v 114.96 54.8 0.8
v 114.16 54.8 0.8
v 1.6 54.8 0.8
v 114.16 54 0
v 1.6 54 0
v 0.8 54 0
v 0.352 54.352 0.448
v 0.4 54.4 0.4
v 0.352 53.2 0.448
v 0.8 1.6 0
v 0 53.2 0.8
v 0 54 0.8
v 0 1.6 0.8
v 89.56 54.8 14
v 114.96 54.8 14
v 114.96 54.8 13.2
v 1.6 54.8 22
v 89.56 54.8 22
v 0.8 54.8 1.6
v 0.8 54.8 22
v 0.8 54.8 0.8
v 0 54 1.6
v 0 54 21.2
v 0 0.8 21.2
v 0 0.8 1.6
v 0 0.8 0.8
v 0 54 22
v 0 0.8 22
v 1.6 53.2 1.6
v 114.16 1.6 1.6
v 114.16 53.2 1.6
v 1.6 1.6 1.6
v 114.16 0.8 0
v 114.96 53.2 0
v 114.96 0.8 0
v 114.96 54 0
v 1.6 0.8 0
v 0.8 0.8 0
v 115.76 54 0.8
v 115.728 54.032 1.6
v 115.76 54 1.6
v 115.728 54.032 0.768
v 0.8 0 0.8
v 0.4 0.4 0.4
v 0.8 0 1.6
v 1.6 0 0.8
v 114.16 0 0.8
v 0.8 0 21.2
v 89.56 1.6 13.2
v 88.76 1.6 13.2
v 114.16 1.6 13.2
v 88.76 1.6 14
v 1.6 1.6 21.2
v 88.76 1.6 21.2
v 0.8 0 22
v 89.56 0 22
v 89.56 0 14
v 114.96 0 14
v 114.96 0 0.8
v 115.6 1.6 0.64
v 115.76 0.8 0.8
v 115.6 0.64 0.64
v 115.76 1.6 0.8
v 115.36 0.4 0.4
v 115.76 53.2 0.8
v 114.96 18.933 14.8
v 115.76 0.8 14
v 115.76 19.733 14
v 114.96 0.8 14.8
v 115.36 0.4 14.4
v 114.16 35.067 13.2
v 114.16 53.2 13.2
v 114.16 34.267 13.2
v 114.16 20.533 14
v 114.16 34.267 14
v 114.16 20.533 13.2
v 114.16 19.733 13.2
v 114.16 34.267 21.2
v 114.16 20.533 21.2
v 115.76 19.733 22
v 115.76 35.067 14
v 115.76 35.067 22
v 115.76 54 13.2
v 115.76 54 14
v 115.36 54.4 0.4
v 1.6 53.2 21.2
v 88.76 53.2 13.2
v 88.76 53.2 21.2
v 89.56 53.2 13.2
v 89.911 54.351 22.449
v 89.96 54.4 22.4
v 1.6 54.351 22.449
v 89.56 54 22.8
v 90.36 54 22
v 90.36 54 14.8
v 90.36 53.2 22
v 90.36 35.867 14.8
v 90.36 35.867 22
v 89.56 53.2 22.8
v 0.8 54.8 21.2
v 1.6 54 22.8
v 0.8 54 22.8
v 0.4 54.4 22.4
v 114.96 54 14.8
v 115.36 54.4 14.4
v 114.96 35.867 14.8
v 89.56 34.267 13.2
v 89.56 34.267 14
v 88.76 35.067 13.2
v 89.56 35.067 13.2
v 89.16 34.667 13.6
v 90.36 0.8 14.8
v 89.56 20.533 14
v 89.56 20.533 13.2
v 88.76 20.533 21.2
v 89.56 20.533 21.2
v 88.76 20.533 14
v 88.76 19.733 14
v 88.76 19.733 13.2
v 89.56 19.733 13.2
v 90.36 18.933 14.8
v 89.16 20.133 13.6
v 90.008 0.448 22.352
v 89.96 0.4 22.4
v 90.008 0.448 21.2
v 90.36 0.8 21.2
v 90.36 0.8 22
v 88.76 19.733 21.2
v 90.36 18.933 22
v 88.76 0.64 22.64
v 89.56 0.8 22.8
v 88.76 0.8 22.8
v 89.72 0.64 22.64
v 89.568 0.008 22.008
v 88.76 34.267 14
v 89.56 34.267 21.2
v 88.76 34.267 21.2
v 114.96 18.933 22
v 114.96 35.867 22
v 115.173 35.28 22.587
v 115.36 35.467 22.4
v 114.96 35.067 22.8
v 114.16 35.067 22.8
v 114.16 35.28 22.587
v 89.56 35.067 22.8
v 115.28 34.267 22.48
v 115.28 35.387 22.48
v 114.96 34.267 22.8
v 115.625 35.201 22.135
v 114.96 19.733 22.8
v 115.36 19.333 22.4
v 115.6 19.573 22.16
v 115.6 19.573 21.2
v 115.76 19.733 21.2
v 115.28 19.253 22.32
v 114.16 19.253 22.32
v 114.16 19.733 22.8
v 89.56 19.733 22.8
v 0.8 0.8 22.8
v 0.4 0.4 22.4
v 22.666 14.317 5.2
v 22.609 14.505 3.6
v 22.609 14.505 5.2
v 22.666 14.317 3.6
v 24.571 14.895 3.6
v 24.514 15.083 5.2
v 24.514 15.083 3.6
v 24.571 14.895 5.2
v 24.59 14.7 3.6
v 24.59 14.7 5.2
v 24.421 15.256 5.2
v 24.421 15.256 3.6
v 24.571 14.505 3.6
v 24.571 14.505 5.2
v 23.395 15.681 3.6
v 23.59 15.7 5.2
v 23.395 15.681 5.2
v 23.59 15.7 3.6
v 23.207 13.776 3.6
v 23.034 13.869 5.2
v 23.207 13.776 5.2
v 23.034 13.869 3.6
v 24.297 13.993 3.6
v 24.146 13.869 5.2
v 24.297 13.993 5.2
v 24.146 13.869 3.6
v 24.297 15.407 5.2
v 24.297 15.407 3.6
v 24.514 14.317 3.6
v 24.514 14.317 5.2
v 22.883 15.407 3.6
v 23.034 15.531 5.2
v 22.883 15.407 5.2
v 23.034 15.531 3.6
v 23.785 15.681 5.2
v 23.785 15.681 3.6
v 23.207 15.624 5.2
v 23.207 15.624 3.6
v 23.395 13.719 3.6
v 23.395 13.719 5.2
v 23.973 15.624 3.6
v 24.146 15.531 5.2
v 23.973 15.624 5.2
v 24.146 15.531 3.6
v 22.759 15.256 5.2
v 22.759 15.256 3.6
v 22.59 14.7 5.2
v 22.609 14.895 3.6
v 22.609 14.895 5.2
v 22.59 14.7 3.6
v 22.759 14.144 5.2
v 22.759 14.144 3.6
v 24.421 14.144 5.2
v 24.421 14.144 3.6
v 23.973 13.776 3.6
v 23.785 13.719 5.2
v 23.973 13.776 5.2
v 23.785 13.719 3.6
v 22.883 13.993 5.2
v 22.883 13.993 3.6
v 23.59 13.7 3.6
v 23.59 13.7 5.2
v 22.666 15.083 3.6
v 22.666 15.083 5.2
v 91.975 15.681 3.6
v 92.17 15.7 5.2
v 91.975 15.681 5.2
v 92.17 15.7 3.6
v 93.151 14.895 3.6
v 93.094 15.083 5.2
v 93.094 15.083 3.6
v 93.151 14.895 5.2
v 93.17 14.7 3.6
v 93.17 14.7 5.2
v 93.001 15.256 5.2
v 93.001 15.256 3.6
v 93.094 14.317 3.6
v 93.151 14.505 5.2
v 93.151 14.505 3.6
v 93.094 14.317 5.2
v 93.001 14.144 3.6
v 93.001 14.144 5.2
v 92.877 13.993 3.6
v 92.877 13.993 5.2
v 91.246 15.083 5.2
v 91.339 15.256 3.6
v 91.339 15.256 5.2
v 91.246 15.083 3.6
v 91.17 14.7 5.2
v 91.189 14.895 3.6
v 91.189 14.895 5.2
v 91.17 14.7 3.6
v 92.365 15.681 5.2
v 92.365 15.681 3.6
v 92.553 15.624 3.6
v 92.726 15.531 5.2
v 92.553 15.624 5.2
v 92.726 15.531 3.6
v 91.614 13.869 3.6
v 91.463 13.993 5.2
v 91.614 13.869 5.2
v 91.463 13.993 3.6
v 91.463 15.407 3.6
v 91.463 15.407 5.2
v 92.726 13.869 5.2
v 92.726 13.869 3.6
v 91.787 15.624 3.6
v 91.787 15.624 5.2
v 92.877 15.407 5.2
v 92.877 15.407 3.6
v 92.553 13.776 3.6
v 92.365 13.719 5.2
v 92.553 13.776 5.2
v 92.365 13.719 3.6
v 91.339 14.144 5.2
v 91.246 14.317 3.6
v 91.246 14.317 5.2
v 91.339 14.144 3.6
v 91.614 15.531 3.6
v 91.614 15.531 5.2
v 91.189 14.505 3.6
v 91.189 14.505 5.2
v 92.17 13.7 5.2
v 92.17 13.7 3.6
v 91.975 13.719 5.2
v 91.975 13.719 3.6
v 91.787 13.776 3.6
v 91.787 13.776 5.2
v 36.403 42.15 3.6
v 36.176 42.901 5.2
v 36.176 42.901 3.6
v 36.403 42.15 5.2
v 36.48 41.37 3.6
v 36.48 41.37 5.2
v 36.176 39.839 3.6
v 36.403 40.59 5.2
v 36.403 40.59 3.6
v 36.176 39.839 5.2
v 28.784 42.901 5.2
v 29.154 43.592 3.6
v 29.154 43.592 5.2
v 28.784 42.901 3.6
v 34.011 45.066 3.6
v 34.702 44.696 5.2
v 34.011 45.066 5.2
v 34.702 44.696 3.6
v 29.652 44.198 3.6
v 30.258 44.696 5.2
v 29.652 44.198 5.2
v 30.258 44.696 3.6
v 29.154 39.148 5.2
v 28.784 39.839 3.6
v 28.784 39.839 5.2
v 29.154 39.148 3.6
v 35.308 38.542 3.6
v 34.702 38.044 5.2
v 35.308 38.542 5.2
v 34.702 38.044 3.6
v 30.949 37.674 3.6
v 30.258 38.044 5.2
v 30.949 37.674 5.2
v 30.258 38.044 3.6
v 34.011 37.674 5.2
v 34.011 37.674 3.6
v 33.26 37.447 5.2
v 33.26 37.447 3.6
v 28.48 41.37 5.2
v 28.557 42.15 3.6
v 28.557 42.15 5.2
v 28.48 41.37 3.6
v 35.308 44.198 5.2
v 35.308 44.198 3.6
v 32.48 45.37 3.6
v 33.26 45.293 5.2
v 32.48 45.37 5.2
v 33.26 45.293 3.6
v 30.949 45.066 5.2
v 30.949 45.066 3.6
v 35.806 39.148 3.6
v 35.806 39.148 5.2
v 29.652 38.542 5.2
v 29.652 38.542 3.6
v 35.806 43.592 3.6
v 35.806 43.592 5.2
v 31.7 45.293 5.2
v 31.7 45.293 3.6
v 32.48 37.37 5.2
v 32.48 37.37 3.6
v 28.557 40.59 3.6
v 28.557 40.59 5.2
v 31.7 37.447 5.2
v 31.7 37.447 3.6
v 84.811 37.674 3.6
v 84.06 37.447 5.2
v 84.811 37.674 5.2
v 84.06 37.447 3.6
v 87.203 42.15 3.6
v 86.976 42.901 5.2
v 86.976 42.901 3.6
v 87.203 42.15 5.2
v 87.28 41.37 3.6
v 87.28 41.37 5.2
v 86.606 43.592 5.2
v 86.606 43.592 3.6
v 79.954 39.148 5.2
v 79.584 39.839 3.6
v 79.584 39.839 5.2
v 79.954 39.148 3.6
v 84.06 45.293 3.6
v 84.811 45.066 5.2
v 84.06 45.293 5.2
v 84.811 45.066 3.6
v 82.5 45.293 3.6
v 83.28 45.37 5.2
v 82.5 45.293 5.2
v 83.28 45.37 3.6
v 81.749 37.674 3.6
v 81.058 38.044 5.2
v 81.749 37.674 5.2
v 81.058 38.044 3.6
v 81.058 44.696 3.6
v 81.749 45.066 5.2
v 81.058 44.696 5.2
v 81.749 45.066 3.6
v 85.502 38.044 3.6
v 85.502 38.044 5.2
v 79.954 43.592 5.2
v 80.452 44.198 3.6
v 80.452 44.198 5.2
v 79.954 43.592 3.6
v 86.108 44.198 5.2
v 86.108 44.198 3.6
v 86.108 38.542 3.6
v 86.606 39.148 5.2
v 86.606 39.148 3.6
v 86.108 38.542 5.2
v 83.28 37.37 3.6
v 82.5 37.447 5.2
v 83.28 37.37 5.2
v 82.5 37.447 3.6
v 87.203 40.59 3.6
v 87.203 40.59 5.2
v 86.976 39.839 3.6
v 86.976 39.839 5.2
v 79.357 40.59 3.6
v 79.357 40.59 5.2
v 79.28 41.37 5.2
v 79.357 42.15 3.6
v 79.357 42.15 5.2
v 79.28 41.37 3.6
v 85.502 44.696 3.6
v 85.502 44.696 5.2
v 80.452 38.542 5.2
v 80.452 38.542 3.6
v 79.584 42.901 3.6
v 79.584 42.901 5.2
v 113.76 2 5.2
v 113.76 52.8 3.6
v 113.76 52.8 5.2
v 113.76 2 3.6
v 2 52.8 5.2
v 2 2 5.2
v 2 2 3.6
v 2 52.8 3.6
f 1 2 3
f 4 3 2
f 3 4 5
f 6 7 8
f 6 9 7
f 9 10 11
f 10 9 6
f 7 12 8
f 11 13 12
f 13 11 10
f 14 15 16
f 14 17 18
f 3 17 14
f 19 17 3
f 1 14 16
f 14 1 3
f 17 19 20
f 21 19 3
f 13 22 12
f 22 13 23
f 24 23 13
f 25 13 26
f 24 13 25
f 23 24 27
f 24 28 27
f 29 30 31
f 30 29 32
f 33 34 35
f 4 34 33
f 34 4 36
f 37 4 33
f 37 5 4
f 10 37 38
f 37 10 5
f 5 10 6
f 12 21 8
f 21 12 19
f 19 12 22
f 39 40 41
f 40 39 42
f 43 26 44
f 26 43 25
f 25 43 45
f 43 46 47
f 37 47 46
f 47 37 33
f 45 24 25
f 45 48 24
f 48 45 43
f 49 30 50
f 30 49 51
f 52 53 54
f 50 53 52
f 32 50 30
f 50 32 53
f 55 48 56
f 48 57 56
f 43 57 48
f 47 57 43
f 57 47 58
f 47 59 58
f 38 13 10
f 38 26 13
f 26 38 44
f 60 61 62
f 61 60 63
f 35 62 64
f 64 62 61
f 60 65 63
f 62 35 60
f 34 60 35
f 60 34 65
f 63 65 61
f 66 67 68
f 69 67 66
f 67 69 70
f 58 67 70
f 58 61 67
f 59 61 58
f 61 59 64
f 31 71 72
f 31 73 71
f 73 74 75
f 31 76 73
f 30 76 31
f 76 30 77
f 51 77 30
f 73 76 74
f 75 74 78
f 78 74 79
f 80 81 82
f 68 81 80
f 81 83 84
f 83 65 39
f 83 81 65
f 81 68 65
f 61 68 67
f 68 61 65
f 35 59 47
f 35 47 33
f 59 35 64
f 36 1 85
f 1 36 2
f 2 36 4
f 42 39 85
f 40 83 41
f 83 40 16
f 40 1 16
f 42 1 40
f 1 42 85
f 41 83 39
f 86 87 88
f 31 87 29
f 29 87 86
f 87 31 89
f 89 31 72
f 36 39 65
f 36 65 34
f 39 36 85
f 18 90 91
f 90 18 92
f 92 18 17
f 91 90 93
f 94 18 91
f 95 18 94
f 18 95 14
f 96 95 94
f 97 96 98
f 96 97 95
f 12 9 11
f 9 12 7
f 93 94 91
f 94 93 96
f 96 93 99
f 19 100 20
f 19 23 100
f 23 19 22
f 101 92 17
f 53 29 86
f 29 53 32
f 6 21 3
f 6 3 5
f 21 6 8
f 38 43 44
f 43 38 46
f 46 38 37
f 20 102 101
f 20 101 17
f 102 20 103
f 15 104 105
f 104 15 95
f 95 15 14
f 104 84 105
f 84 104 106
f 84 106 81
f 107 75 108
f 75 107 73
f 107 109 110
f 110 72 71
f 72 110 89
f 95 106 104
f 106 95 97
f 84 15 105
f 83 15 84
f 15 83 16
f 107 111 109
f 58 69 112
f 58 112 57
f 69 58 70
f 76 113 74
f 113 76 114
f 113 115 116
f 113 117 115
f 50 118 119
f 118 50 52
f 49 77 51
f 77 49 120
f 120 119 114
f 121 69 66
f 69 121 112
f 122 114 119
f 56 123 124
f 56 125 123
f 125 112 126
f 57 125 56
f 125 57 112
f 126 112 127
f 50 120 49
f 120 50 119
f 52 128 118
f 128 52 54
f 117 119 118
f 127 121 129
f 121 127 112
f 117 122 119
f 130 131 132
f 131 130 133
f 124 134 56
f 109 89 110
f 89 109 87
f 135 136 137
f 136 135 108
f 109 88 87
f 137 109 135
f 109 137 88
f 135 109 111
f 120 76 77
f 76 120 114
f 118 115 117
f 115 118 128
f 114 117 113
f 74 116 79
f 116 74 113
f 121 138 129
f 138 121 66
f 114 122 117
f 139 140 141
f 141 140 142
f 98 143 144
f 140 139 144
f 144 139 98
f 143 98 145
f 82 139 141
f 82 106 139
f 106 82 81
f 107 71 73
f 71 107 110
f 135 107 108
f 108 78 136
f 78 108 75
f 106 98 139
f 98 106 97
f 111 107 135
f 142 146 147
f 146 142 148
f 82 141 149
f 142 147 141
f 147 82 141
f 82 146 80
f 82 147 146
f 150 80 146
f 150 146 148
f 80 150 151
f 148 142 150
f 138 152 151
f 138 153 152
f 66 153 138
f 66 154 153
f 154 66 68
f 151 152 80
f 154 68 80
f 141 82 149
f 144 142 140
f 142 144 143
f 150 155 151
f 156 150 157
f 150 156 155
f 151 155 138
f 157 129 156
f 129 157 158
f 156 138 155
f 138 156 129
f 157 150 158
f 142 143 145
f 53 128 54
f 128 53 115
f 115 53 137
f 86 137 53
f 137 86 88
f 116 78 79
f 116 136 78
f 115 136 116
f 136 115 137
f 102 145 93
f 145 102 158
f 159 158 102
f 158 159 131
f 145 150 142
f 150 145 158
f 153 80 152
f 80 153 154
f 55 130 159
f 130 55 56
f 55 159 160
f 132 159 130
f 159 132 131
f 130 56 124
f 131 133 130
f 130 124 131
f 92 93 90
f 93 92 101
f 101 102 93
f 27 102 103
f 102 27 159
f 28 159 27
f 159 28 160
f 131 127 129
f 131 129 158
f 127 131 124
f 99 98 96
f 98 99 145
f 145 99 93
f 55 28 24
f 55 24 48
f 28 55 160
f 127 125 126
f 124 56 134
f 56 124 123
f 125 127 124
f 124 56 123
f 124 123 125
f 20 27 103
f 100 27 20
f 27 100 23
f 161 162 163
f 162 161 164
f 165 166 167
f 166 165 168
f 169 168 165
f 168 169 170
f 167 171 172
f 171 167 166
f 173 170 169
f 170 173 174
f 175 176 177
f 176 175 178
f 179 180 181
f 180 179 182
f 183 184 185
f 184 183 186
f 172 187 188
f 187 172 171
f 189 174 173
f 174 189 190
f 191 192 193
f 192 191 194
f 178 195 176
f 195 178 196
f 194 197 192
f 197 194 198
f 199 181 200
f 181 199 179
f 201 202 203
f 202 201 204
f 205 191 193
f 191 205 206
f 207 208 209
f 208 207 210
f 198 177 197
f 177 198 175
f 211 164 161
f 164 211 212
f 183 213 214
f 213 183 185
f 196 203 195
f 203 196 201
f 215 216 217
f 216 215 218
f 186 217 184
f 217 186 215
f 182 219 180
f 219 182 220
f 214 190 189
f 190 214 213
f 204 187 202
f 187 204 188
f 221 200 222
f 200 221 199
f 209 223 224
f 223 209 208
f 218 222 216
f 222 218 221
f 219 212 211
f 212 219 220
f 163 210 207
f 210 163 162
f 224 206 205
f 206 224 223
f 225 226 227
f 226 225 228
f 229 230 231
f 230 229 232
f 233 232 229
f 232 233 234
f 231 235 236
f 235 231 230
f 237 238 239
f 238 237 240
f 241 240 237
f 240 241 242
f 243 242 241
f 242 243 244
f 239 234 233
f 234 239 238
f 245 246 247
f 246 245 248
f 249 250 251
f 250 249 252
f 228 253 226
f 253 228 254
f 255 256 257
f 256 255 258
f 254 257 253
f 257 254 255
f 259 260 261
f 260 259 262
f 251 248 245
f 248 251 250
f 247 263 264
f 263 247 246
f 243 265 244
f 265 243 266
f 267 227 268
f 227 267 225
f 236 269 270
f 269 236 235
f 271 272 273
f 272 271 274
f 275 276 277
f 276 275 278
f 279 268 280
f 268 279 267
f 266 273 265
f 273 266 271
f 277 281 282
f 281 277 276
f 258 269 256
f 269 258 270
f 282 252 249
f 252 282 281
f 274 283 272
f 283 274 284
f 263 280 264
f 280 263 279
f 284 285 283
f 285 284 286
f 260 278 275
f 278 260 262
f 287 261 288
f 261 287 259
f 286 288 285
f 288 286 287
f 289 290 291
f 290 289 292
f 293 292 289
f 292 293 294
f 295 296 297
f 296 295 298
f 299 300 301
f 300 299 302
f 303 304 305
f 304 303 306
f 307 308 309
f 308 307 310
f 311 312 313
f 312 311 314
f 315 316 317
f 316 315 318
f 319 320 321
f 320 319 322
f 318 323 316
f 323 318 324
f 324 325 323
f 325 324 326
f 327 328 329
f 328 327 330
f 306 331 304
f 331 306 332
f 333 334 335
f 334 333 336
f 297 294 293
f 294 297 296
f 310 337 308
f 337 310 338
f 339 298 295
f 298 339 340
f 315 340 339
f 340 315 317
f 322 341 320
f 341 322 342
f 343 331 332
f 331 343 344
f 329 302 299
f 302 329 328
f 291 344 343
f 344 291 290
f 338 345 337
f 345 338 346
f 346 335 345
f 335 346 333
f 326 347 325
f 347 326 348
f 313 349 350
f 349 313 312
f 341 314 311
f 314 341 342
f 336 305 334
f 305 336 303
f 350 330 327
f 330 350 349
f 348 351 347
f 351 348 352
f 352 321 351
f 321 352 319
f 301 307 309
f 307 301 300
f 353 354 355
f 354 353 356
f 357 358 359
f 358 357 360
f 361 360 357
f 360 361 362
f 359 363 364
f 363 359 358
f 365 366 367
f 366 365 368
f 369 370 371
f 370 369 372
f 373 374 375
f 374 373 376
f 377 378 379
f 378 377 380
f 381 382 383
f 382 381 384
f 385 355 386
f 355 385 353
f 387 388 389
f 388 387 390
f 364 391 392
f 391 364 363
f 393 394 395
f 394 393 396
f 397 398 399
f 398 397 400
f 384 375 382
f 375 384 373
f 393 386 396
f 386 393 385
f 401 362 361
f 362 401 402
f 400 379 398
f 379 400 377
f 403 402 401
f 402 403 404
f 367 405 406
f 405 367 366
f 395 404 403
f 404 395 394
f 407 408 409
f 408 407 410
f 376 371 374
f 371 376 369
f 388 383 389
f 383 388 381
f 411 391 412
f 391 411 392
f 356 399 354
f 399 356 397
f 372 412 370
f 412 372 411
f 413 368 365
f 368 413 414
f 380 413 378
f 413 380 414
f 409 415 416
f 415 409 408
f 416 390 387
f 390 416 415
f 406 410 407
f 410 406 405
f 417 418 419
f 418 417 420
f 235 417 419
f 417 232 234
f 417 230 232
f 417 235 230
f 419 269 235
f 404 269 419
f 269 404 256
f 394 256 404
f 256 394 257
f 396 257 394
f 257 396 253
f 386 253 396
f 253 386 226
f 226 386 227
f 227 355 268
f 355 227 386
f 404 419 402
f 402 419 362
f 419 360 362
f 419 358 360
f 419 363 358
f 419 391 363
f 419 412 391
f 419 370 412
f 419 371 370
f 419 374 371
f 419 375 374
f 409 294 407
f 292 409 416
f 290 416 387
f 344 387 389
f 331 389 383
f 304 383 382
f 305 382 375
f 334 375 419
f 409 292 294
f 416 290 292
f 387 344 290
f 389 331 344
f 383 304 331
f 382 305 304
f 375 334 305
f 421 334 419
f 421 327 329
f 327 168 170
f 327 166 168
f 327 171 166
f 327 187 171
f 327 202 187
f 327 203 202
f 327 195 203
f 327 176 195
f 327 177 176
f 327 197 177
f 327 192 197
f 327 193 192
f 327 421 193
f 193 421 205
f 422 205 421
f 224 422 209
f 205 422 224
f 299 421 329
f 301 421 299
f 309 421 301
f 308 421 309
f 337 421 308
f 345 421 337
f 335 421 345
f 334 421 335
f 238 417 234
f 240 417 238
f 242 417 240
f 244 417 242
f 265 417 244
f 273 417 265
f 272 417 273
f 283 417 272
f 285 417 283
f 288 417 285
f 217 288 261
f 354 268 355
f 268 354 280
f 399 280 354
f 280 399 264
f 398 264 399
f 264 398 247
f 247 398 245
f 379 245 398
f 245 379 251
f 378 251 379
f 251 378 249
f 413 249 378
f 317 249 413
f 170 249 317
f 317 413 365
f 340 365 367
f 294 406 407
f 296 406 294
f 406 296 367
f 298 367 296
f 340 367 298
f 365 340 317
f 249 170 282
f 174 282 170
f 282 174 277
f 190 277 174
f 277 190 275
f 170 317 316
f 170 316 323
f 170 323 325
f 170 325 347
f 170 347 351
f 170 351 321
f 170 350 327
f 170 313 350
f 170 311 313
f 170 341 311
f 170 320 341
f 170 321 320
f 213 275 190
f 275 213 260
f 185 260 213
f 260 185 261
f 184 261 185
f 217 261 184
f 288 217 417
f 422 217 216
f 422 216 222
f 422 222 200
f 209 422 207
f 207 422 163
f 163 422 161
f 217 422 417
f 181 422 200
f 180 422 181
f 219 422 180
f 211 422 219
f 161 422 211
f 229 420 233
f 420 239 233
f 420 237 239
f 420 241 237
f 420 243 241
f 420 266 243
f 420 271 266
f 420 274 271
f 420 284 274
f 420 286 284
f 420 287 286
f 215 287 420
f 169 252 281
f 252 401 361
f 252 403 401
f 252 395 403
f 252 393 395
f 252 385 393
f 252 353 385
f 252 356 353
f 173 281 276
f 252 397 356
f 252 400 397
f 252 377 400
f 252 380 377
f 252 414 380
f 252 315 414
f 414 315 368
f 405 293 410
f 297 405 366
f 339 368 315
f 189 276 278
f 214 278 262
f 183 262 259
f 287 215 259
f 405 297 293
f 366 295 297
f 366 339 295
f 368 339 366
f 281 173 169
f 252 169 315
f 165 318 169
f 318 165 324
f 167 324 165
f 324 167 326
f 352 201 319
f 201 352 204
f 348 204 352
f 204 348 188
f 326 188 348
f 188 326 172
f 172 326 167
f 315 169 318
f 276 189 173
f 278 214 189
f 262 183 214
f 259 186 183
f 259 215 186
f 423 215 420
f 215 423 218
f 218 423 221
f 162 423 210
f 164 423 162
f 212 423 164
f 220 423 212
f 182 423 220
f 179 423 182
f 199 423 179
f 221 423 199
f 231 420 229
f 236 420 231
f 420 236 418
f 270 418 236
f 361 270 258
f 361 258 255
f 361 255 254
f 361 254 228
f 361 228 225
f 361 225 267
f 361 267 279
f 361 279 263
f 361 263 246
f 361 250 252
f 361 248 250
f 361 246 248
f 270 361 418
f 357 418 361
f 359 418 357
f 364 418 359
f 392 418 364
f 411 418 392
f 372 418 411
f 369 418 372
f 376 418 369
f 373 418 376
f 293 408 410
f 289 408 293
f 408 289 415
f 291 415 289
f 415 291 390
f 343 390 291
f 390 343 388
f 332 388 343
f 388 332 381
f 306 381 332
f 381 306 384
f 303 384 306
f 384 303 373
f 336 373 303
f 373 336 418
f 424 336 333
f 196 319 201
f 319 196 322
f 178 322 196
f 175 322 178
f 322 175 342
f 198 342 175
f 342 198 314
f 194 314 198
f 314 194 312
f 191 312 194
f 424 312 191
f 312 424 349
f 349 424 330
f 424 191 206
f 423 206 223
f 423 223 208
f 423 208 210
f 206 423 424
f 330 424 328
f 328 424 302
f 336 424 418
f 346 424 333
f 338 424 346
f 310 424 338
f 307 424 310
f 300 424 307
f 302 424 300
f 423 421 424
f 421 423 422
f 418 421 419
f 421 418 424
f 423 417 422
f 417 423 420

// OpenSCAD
$fn=32;

PCB_BELOW=2;
PCB_T=1.6;      // pcb thickness
PCB_S=2-PCB_T;  // spacing between pcb/wall
PCB_Z=2;        // spacing between pcb/botton
PCB_OVER=16.555;
WALL_TH=1.6;

MIL=25.4/1000;
PCB_W=4400 * MIL;
PCB_W0=3400 * MIL;
PCB_H=2000 * MIL;
PCB_HB_X=1200 * MIL;
PCB_HB_Y=450 * MIL;
PCB_HA_X=850 * MIL;
PCB_HA_Y=500 * MIL;

PCB_OVER=16;       // space needed above pcb


module holeCutter(w) {
	translate([0,0,-5])
	cylinder(d1=w,d2=w,h=10);
}

module atPcbMountHolePositions() {
translate([PCB_HA_X,PCB_HA_Y,0])
	children();
translate([PCB_W-PCB_HA_X,PCB_HA_Y,0])
	children();
}
module atBoxMountHolePositions() {
translate([PCB_HB_X,PCB_H-PCB_HB_Y,0])
	children();
translate([PCB_W-PCB_HB_X,PCB_H-PCB_HB_Y,0])
	children();
}
module pcb() {
    color([.3,.7,0])
    difference() {
    cube([PCB_W,PCB_H,PCB_T] );
    atPcbMountHolePositions()
        holeCutter(2);
    atBoxMountHolePositions()
        holeCutter(8);

    }
}

// chamfered on the XZ plane
module cube1(a){
     XM=a[0]+a[1]+a[2];
    DEPTH=WALL_TH/2;
    difference(){
        cube([a[0],a[1],a[2]]);
    
        rotate(45,[0,1,0]){
            cube([sqrt(2)*DEPTH,3*a[1],sqrt(2)*DEPTH],center=true);
        }
        translate([a[0],0,0])
        rotate(45,[0,1,0]){
            cube([sqrt(2)*DEPTH,3*a[1],sqrt(2)*DEPTH],center=true);
        }
        translate([a[0],0,a[2]])
        rotate(45,[0,1,0]){
            cube([sqrt(2)*DEPTH,3*a[1],sqrt(2)*DEPTH],center=true);
        }
        translate([0,0,a[2]])
        rotate(45,[0,1,0]){
            cube([sqrt(2)*DEPTH,3*a[1],sqrt(2)*DEPTH],center=true);
        }
        translate([0,DEPTH,0]) {
            rotate(-135,[0,0,1])
                    translate([0,0,-1])
                    cube(XM,XM,XM);
            translate([a[0],0,0])
            rotate(-135,[0,0,1])
                    translate([0,0,-1])
                    cube(XM,XM,XM);
            rotate(90,[0,1,0]){
            rotate(-135,[0,0,1])
                    translate([0,0,-1])
                    cube(XM,XM,XM);
            translate([-a[2],0,0])
            rotate(-135,[0,0,1])
                    translate([0,0,-1])
                    cube(XM,XM,XM);
            }
        }
        translate([a[0]/2,0,a[2]/2])
            rotate(90,[1,0,0])
            text("FRONT",size=min(a[0],a[2])/5,halign="center",valign="center");

    }
}

//projection(cut=true)
//translate([0,0,-PCB_Z-PCB_T])
{
//pcb();

A=WALL_TH+PCB_S+PCB_W+PCB_S+WALL_TH;
A0=WALL_TH+PCB_S+PCB_W0+PCB_S+WALL_TH;
B=WALL_TH+PCB_S+PCB_H+PCB_S+WALL_TH;
B0=WALL_TH+PCB_S+PCB_H/3+WALL_TH;
D=WALL_TH+PCB_Z+PCB_T+PCB_OVER+WALL_TH;
D0=WALL_TH+PCB_Z+PCB_T+PCB_OVER/2+WALL_TH;
echo(D);
    translate([0,B,0])
    rotate(90,[1,0,0])
        cube1([A,WALL_TH,B]);
color([.7,.1,0]) {
    cube1([A0,WALL_TH,D]);
    translate([A0-2*WALL_TH,0,0])
    cube1([A-A0+2*WALL_TH,WALL_TH,D0]);
    translate([A,0,0])
    rotate(90,[0,0,1])  cube1([B,WALL_TH,D0]);
    translate([A,B,0])
    rotate(180,[0,0,1])  cube1([A-A0+WALL_TH*2,WALL_TH,D0]);
    translate([A0,B,0])
    rotate(180,[0,0,1])  cube1([A0,WALL_TH,D]);
    translate([0,B,0])
    rotate(270,[0,0,1])  cube1([B,WALL_TH,D]);
//    translate([A0-WALL_TH,0,D0])
  //  rotate(-90,[1,0,0])
    //    cube1([A-A0+WALL_TH,WALL_TH,B0]);
    
    translate([A,B,D0])
    rotate(180,[0,0,1])
    rotate(-90,[1,0,0])
        cube1([A-A0+WALL_TH,WALL_TH,B0]);
    
    translate([A0,0,D0-WALL_TH]) {
        translate([-WALL_TH,0,WALL_TH])
        rotate(-90,[1,0,0])
            cube1([A-A0+WALL_TH,WALL_TH,B0]);
    rotate(90,[0,0,1])  {
        cube1([B0,WALL_TH,D-D0+WALL_TH]);
        translate([B-B0,0,0]) 
        cube1([B0,WALL_TH,D-D0+WALL_TH]);
    }
        translate([-WALL_TH,B0-WALL_TH,0])
                cube1([A-A0+WALL_TH,WALL_TH,D-D0+WALL_TH]);

        translate([A-A0,B-B0,0])
        translate([0,WALL_TH,0])
    rotate(180,[0,0,1])
                cube1([A-A0+WALL_TH,WALL_TH,D-D0+WALL_TH]);
    }
        translate([A,B0-WALL_TH,D0-WALL_TH*2])
rotate(90,[0,0,1])                 cube1([B-2*B0+2*WALL_TH,WALL_TH,D-D0+2*WALL_TH]);
    
        translate([A0-2*WALL_TH,B0-WALL_TH,D])
rotate(-90,[1,0,0])
            cube1([A-A0+2*WALL_TH,WALL_TH,B-2*B0+2*WALL_TH]);
        translate([0,0,D])
rotate(-90,[1,0,0])
            cube1([A0,WALL_TH,B]);

}

translate([WALL_TH+PCB_S,WALL_TH+PCB_S,WALL_TH+PCB_Z])
    pcb();
}
